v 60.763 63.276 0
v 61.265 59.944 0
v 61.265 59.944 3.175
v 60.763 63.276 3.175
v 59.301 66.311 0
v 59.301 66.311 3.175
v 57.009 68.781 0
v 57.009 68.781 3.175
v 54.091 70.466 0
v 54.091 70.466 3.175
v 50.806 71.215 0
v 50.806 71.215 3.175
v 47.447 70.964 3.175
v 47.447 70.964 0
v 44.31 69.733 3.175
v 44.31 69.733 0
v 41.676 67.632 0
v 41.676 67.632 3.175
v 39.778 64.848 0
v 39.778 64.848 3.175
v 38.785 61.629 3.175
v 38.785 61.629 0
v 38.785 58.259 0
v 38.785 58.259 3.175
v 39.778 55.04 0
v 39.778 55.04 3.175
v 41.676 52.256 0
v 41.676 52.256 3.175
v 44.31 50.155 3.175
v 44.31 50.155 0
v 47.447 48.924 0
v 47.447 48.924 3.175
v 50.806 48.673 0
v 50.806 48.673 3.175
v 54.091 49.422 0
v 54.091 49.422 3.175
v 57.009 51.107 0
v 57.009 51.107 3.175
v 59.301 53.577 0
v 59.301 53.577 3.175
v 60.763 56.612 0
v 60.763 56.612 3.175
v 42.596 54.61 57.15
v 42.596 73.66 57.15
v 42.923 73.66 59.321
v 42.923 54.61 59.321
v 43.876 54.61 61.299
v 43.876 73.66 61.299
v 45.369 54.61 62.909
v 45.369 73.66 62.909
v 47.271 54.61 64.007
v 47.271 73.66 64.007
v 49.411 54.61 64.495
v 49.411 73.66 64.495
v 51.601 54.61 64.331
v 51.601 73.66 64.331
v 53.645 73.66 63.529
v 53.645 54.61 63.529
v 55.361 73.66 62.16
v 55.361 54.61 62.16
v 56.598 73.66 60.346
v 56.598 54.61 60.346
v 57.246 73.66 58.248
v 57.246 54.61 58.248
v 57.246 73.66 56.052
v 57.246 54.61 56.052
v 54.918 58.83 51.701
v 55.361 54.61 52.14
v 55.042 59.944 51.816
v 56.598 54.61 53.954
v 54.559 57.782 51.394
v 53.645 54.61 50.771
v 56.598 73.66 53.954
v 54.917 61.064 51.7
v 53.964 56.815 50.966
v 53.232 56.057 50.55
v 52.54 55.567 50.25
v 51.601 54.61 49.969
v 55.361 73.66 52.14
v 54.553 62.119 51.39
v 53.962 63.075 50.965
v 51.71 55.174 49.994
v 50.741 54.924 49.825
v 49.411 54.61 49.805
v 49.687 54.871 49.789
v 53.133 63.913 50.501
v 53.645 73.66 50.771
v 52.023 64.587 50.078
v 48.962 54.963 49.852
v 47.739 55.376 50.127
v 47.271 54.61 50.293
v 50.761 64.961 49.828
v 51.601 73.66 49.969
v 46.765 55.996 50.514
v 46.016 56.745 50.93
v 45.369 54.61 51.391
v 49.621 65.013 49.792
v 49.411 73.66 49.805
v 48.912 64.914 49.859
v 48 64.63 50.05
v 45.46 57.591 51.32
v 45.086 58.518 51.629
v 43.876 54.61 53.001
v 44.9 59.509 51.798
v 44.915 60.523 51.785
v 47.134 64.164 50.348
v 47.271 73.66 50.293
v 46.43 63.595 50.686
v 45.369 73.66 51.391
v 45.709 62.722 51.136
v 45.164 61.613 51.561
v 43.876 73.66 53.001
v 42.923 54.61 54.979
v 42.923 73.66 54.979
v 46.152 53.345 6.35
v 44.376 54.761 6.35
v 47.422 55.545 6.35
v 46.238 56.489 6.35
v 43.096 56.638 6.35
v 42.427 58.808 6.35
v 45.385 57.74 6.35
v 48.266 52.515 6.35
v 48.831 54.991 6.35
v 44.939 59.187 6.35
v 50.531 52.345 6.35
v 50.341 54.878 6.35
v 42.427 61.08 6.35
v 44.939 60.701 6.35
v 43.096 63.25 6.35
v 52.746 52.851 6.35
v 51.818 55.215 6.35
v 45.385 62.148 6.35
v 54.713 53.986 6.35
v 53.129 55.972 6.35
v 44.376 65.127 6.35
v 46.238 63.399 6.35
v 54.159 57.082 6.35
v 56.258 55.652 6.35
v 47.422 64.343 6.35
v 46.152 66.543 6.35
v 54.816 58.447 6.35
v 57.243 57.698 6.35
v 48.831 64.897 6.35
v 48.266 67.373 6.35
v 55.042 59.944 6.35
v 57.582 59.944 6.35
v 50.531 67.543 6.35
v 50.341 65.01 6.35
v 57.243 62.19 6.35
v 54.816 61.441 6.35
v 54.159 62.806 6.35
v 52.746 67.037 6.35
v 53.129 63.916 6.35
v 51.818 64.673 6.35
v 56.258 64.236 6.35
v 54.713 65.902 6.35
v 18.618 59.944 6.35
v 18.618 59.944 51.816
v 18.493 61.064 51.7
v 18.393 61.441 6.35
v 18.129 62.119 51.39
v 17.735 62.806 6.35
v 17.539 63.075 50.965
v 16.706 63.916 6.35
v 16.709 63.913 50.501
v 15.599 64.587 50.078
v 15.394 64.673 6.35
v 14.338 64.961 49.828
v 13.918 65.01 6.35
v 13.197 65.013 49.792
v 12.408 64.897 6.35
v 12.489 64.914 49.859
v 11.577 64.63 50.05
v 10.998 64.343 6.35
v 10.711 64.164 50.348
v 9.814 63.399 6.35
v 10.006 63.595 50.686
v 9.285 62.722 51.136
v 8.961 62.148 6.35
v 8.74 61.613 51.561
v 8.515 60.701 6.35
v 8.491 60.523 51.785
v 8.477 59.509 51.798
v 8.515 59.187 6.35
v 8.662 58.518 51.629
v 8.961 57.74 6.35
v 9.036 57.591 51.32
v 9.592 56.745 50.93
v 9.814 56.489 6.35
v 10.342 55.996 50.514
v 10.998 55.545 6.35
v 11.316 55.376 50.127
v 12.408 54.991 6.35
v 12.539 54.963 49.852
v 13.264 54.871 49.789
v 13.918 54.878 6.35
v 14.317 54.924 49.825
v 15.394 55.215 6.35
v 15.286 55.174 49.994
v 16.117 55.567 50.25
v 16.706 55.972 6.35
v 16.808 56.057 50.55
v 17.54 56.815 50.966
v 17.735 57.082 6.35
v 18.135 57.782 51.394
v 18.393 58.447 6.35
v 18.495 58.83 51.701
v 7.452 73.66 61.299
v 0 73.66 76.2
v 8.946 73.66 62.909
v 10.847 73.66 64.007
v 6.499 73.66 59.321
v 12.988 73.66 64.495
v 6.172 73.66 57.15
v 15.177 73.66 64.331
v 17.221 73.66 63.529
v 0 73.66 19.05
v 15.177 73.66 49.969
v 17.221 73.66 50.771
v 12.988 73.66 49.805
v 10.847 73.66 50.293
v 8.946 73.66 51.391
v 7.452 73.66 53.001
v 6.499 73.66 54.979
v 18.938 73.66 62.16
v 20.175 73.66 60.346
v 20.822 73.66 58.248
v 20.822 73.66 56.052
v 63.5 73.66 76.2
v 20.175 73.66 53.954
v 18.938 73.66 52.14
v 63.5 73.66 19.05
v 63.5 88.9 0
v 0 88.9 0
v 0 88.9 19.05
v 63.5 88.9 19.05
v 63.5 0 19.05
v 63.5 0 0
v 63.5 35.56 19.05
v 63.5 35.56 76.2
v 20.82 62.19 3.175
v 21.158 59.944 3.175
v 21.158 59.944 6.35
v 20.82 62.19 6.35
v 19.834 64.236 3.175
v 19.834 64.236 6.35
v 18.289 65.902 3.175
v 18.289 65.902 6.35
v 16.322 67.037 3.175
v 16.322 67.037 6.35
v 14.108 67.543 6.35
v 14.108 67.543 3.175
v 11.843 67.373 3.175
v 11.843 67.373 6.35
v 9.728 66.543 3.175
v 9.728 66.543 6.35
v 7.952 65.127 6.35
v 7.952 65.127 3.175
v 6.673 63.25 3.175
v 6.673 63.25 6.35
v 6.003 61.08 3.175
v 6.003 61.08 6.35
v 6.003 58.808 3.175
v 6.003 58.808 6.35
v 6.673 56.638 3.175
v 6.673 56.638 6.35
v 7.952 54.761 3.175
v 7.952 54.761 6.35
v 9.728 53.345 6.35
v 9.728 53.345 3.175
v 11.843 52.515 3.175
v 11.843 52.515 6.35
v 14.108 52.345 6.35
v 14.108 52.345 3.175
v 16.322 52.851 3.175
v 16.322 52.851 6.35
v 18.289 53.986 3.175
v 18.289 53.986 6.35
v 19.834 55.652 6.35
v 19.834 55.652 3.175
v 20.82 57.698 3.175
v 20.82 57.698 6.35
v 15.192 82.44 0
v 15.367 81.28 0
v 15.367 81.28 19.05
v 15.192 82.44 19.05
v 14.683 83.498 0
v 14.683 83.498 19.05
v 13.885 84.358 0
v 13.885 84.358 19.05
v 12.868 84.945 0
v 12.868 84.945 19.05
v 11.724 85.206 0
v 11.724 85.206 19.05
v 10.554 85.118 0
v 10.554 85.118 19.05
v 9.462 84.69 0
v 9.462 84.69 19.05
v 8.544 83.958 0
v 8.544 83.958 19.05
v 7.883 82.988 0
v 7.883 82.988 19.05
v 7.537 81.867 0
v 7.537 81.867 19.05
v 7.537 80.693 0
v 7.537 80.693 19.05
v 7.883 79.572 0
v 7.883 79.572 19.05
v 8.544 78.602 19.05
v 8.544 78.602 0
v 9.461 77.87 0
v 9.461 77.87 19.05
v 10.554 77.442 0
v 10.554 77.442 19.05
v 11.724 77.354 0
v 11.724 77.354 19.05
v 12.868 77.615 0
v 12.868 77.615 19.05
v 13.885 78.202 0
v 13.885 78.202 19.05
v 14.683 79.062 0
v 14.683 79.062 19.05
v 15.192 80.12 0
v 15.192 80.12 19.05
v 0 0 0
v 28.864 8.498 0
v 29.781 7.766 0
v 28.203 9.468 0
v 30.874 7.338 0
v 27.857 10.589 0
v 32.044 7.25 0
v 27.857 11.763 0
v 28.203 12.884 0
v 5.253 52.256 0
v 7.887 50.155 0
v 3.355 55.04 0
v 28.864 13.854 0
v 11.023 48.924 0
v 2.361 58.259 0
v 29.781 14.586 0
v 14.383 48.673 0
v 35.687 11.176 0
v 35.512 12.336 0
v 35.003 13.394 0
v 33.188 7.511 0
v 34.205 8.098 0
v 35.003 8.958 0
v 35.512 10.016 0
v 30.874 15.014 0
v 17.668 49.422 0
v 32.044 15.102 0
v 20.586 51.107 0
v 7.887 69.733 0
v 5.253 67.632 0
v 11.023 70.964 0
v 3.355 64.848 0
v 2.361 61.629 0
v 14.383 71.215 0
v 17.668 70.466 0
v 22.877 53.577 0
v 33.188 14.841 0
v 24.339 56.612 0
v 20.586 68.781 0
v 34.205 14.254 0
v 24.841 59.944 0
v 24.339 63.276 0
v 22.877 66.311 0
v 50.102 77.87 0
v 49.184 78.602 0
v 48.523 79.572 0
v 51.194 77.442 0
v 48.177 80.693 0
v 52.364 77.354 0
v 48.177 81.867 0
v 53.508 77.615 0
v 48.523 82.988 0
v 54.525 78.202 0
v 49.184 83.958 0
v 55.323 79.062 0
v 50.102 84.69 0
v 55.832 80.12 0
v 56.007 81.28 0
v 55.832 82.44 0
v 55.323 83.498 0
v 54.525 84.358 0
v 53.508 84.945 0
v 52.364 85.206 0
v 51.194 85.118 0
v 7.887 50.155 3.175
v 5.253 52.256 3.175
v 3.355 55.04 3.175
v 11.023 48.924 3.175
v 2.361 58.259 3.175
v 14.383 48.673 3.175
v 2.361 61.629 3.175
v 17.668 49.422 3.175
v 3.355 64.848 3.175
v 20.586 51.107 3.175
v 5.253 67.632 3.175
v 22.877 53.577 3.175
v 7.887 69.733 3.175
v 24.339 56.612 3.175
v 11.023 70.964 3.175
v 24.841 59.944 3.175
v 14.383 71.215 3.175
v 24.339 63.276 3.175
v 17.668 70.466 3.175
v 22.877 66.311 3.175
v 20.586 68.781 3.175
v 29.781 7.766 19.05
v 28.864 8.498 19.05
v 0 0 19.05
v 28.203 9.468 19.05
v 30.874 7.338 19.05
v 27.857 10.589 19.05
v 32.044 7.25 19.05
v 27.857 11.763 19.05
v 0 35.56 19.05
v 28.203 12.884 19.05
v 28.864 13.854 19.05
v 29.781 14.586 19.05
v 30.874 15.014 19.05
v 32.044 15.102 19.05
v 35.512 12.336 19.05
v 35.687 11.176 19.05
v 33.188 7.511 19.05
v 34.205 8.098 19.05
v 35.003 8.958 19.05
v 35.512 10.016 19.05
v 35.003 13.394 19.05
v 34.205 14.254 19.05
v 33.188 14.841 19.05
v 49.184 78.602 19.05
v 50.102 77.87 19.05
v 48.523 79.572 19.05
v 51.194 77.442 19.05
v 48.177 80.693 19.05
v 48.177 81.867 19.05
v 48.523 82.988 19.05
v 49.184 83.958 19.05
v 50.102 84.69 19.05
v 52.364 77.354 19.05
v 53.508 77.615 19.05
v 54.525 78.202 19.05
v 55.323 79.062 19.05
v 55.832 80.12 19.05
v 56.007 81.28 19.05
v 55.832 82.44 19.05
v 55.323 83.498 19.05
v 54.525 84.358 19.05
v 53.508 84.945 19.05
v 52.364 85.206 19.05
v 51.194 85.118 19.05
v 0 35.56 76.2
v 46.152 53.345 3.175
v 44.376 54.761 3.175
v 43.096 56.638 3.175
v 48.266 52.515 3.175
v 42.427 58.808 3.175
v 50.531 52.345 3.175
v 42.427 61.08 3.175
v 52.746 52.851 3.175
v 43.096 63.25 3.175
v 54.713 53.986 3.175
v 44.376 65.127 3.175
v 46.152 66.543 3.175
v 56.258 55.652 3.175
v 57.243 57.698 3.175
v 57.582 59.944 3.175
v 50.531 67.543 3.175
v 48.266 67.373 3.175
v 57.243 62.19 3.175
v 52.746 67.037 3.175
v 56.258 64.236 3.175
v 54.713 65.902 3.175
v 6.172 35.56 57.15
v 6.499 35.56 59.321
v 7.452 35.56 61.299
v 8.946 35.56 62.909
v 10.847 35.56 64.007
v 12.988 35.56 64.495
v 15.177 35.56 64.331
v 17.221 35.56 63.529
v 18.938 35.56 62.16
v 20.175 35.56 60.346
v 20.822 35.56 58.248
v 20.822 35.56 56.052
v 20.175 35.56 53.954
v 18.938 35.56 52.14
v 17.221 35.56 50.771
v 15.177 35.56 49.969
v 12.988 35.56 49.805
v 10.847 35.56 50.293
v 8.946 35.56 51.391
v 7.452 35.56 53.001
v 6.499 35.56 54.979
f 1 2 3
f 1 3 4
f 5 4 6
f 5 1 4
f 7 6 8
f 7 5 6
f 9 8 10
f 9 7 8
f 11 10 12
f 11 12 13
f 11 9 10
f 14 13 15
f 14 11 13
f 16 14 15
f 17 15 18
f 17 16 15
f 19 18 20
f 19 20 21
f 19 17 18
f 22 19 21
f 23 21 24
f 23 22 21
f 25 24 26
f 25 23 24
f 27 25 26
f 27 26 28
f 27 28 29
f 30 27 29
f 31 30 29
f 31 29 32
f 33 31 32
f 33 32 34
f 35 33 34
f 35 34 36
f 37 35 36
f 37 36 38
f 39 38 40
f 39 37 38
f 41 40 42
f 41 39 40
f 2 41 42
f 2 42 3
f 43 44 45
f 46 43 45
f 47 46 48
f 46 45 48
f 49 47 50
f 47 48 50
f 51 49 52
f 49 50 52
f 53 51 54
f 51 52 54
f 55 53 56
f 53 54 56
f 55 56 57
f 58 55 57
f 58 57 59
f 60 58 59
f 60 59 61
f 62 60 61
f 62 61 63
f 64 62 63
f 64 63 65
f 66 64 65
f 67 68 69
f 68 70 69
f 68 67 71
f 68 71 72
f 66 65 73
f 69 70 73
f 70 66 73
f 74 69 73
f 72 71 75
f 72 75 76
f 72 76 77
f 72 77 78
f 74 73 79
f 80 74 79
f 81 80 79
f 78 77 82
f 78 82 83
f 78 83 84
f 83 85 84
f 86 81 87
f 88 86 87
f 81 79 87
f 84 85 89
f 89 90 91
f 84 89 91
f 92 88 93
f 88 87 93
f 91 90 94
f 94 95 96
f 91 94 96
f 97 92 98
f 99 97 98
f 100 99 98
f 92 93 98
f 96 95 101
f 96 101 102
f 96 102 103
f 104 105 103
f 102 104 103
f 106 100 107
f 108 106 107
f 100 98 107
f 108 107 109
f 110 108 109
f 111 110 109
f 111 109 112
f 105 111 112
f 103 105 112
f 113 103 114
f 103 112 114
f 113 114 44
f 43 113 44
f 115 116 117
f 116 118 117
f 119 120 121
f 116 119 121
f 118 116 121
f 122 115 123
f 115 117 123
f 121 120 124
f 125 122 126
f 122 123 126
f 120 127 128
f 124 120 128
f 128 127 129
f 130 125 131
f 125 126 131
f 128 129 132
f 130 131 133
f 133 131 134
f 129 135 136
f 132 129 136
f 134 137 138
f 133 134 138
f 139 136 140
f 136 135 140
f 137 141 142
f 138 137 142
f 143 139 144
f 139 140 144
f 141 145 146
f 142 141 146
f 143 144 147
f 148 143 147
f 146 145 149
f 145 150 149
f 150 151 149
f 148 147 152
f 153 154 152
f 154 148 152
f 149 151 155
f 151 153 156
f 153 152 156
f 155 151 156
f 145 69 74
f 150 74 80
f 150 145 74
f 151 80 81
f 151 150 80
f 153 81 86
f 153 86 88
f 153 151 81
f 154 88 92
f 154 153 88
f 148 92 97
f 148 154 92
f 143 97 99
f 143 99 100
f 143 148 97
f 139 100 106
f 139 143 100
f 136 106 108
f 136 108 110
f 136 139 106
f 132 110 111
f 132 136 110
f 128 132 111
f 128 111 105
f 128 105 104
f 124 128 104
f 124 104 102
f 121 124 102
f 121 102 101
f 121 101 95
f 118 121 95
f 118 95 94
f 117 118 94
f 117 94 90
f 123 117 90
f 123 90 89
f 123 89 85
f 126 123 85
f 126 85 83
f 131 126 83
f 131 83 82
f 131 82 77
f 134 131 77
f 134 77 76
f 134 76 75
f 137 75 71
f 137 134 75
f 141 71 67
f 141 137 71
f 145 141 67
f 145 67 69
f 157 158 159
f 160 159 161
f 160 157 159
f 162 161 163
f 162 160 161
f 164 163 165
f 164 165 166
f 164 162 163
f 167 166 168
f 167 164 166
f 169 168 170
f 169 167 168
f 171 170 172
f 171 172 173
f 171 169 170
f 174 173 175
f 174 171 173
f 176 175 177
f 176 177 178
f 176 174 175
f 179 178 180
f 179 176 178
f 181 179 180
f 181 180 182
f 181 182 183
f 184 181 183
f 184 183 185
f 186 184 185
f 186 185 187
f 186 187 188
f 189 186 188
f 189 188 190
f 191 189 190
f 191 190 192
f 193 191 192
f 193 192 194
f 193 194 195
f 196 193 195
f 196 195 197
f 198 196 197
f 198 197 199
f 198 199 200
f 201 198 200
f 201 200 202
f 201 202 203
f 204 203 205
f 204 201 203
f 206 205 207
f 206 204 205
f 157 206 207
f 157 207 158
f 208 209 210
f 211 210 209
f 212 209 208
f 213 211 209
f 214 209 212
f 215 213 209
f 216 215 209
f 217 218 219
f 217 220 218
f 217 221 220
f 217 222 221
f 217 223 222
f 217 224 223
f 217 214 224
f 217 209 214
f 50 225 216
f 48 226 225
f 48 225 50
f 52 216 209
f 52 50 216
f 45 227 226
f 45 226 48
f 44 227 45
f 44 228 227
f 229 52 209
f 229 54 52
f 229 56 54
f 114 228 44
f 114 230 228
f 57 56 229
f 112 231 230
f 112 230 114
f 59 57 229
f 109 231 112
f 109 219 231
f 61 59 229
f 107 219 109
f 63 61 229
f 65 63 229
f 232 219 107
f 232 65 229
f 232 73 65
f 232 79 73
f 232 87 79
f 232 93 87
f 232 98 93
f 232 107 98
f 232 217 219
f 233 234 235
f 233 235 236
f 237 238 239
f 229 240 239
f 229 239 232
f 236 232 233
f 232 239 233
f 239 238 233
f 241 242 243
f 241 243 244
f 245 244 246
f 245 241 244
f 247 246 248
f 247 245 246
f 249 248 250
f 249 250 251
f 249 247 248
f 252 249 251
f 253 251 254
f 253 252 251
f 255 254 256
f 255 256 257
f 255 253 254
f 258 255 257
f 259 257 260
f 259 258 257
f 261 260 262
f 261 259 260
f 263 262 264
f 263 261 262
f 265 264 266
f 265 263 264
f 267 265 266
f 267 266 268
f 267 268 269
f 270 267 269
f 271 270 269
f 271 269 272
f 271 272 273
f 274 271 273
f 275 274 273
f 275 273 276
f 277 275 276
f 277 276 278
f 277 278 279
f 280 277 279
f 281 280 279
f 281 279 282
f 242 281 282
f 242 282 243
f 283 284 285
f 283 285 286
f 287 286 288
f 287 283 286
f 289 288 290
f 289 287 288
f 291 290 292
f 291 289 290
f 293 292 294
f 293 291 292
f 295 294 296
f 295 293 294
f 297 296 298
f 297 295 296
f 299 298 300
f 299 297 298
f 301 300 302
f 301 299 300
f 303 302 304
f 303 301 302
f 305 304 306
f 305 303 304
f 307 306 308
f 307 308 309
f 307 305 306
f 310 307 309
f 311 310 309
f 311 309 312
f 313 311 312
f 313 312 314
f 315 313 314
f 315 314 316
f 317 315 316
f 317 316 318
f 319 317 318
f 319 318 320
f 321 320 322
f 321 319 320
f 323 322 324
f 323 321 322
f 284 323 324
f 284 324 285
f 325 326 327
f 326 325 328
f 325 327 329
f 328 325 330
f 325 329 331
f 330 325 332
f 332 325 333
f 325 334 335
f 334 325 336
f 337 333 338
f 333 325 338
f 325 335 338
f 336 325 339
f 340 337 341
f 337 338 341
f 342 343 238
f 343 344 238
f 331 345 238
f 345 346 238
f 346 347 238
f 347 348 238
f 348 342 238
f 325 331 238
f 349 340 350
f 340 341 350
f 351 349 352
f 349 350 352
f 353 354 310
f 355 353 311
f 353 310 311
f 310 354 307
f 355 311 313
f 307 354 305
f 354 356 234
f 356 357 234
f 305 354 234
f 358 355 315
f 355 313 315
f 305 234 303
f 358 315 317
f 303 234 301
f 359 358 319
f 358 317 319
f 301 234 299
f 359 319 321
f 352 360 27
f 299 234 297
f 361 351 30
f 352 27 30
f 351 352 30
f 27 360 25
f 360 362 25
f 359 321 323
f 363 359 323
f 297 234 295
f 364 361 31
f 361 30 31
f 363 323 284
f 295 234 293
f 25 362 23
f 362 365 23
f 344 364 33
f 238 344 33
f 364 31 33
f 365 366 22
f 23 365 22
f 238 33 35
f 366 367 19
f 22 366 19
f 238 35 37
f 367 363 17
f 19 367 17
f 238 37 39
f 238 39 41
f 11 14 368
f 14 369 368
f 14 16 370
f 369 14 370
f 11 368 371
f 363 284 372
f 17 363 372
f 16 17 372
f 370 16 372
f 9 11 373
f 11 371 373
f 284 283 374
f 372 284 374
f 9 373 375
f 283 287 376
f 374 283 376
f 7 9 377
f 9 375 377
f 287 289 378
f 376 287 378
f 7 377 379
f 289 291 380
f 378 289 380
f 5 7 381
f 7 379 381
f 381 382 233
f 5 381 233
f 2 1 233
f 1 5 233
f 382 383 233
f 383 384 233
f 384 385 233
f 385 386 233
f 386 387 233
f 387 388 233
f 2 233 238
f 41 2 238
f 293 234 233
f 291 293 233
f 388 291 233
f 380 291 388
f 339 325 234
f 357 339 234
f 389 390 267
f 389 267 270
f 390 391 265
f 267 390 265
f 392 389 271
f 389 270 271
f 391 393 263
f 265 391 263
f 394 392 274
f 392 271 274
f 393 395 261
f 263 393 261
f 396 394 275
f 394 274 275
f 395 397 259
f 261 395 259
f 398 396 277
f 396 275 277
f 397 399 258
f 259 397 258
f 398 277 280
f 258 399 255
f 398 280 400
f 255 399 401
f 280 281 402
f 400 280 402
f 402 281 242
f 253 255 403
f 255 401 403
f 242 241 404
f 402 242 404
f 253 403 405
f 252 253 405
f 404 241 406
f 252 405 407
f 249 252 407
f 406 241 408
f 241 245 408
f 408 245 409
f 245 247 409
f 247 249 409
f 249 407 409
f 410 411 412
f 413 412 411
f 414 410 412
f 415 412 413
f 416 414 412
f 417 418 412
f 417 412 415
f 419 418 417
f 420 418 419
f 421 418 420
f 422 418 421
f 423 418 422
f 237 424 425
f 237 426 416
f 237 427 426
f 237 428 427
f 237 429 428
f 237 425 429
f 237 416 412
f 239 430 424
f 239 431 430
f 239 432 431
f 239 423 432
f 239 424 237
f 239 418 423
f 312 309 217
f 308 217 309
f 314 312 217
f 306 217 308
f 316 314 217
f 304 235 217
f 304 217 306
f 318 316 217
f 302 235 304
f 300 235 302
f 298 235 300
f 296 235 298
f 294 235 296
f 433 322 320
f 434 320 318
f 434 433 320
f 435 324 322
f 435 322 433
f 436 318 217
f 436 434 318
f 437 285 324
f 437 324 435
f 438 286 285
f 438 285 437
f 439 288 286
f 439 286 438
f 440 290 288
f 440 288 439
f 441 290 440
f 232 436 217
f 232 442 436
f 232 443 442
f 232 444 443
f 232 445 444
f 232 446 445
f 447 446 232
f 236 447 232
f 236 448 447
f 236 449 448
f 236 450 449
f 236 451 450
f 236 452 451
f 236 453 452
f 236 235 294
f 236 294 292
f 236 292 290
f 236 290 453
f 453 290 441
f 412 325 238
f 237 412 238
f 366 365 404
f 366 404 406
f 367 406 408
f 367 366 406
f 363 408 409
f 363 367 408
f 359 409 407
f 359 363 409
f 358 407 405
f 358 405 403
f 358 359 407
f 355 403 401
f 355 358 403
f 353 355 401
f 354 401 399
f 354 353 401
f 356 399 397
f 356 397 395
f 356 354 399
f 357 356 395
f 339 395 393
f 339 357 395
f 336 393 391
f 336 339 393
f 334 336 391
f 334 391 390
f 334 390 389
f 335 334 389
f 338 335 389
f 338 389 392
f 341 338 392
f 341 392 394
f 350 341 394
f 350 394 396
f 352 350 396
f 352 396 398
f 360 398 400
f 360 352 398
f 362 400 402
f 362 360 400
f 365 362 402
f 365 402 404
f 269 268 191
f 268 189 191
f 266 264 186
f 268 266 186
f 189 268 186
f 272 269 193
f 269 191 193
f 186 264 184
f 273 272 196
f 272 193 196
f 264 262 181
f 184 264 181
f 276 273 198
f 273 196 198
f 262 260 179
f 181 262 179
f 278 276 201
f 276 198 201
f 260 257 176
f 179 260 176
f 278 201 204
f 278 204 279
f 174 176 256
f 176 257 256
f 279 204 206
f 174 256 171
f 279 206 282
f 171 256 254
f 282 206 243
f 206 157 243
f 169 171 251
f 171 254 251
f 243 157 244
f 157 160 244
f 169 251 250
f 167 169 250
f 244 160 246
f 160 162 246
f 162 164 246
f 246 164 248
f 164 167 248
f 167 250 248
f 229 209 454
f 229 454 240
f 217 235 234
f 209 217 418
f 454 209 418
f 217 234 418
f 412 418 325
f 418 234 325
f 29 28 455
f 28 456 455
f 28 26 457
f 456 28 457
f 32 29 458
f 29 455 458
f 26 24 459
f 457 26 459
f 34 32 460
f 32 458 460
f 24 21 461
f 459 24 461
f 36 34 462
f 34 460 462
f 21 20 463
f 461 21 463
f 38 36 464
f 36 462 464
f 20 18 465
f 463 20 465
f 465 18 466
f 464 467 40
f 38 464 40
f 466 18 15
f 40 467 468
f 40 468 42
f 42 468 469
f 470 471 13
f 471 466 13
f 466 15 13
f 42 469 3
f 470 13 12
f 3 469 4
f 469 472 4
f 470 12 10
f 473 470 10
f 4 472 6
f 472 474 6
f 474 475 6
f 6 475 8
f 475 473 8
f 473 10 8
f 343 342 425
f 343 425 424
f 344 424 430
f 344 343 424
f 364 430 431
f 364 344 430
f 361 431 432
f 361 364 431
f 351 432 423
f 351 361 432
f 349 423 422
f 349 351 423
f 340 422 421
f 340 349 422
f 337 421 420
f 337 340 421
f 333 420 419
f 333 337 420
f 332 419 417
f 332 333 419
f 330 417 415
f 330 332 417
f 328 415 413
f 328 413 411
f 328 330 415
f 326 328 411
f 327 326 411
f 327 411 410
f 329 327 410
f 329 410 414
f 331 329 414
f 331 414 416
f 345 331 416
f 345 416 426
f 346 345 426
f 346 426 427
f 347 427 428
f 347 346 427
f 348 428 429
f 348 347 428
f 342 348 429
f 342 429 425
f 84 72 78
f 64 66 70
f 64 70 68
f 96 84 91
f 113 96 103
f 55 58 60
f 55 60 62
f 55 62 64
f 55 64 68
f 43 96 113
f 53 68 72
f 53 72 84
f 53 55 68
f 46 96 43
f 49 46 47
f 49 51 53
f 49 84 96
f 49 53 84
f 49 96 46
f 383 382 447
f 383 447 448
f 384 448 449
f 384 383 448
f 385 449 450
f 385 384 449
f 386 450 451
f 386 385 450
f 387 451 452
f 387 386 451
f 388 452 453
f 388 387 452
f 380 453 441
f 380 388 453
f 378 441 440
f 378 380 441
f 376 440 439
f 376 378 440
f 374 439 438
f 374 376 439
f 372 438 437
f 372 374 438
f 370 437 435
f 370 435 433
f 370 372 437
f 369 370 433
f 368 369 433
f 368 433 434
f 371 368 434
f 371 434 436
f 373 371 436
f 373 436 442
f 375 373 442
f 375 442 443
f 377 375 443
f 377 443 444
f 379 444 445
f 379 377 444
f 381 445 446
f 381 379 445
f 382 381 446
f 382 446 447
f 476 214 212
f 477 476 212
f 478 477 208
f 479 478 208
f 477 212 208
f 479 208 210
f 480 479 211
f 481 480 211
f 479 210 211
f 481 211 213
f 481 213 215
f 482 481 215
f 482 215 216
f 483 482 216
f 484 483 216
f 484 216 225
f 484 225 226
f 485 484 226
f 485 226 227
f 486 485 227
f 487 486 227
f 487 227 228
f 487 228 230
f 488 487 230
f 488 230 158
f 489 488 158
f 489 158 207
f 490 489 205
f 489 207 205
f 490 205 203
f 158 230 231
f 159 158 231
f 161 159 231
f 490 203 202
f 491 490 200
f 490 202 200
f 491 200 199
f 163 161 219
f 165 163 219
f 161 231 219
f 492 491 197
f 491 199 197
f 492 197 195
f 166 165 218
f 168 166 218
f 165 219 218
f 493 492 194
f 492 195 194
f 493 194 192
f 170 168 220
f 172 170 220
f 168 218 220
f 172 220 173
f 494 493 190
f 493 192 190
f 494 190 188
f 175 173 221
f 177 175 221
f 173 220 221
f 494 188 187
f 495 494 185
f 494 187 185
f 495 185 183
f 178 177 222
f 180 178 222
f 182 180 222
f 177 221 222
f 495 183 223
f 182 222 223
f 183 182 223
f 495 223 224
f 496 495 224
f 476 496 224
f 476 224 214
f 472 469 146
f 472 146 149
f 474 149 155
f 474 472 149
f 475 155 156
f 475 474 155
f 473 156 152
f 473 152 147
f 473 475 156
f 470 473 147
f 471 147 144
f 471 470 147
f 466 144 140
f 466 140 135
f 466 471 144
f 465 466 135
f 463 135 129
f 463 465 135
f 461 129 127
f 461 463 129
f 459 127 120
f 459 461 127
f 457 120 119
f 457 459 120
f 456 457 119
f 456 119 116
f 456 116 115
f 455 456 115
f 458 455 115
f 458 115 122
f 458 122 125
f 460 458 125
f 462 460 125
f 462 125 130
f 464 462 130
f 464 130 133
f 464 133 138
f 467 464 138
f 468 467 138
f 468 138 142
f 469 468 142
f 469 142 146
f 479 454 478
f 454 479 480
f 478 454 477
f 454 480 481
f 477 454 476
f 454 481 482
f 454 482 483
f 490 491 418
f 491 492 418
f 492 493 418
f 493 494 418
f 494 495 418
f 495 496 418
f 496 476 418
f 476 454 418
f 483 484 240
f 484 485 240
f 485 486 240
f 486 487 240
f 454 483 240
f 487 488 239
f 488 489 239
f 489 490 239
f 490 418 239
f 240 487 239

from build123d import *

# Parameters (mm, degrees)
F0_W     = 63.5
F0_H     = 35.56
F0_R     = 3.937
F0_R_2   = 11.303
F0_R_3   = 7.62
F0_R_4   = 5.08
F0_H_2   = 15.24
F0_H_3   = 38.1
F1_DEPTH = 19.05
F2_DEPTH = 76.2
F3_DEPTH = 3.175
F4_DEPTH = 6.35
F5_R     = 7.366
F6_DEPTH = 19.05
F7_DEPTH = 50.8
F8_DEPTH = 57.15


with BuildPart() as f1:
    # F0 (on Top) → F1 (new body)
    with BuildSketch(Plane.XY):
        with Locations((31.75, 17.78)):
            Rectangle(F0_W, F0_H)
        with Locations((31.75, 11.176)):
            Circle(F0_R, mode=Mode.SUBTRACT)
        with Locations((49.9618, 59.944)):
            Circle(F0_R_2)
        with Locations((49.9618, 59.944)):
            Circle(F0_R_3, mode=Mode.SUBTRACT)
        with Locations((13.5382, 59.944)):
            Circle(F0_R_2)
        with Locations((13.5382, 59.944)):
            Circle(F0_R_3, mode=Mode.SUBTRACT)
        with Locations((49.9618, 59.944)):
            Circle(F0_R_3)
        with Locations((49.9618, 59.944)):
            Circle(F0_R_4, mode=Mode.SUBTRACT)
        with Locations((13.5382, 59.944)):
            Circle(F0_R_3)
        with Locations((13.5382, 59.944)):
            Circle(F0_R_4, mode=Mode.SUBTRACT)
        with Locations((31.75, 81.28)):
            Rectangle(F0_W, F0_H_2)
        with Locations((11.43, 81.28)):
            Circle(F0_R, mode=Mode.SUBTRACT)
        with Locations((52.07, 81.28)):
            Circle(F0_R, mode=Mode.SUBTRACT)
        with Locations((31.75, 54.61)):
            Rectangle(F0_W, F0_H_3)
        with Locations((13.5382, 59.944)):
            Circle(F0_R_2, mode=Mode.SUBTRACT)
        with Locations((49.9618, 59.944)):
            Circle(F0_R_2, mode=Mode.SUBTRACT)
        with Locations((49.9618, 59.944)):
            Circle(F0_R_4)
        with Locations((13.5382, 59.944)):
            Circle(F0_R_4)
    extrude(amount=F1_DEPTH)

    # F0 (on Top) → F2 (join)
    with BuildSketch(Plane.XY):
        with Locations((31.75, 54.61)):
            Rectangle(F0_W, F0_H_3)
        with Locations((13.5382, 59.944)):
            Circle(F0_R_2, mode=Mode.SUBTRACT)
        with Locations((49.9618, 59.944)):
            Circle(F0_R_2, mode=Mode.SUBTRACT)
        with Locations((13.5382, 59.944)):
            Circle(F0_R_2)
        with Locations((13.5382, 59.944)):
            Circle(F0_R_3, mode=Mode.SUBTRACT)
        with Locations((49.9618, 59.944)):
            Circle(F0_R_2)
        with Locations((49.9618, 59.944)):
            Circle(F0_R_3, mode=Mode.SUBTRACT)
        with Locations((49.9618, 59.944)):
            Circle(F0_R_3)
        with Locations((49.9618, 59.944)):
            Circle(F0_R_4, mode=Mode.SUBTRACT)
        with Locations((13.5382, 59.944)):
            Circle(F0_R_3)
        with Locations((13.5382, 59.944)):
            Circle(F0_R_4, mode=Mode.SUBTRACT)
        with Locations((49.9618, 59.944)):
            Circle(F0_R_4)
        with Locations((13.5382, 59.944)):
            Circle(F0_R_4)
    extrude(amount=F2_DEPTH)

    # F0 (on Top) → F3 (cut)
    with BuildSketch(Plane.XY):
        with Locations((49.9618, 59.944)):
            Circle(F0_R_2)
        with Locations((49.9618, 59.944)):
            Circle(F0_R_3, mode=Mode.SUBTRACT)
        with Locations((13.5382, 59.944)):
            Circle(F0_R_2)
        with Locations((13.5382, 59.944)):
            Circle(F0_R_3, mode=Mode.SUBTRACT)
    extrude(amount=F3_DEPTH, mode=Mode.SUBTRACT)

    # F0 (on Top) → F4 (cut)
    with BuildSketch(Plane.XY):
        with Locations((49.9618, 59.944)):
            Circle(F0_R_3)
        with Locations((49.9618, 59.944)):
            Circle(F0_R_4, mode=Mode.SUBTRACT)
        with Locations((13.5382, 59.944)):
            Circle(F0_R_3)
        with Locations((13.5382, 59.944)):
            Circle(F0_R_4, mode=Mode.SUBTRACT)
    extrude(amount=F4_DEPTH, mode=Mode.SUBTRACT)

    # F5 (on face) → F6 (cut)
    with BuildSketch(Plane(origin=(0, 73.66, 0), x_dir=(-1, 0, 0), z_dir=(0, 1, 0))):
        with Locations((-49.9618, 57.15)):
            Circle(F5_R)
    extrude(amount=-F6_DEPTH, mode=Mode.SUBTRACT)

    # F5 (on face) → F7 (cut)
    with BuildSketch(Plane(origin=(0, 73.66, 0), x_dir=(-1, 0, 0), z_dir=(0, 1, 0))):
        with Locations((-13.5382, 57.15)):
            Circle(F5_R)
    extrude(amount=-F7_DEPTH, mode=Mode.SUBTRACT)

    # F0 (on Top) → F8 (cut)
    with BuildSketch(Plane.XY):
        with Locations((49.9618, 59.944)):
            Circle(F0_R_4)
        with Locations((13.5382, 59.944)):
            Circle(F0_R_4)
    extrude(amount=F8_DEPTH, mode=Mode.SUBTRACT)


solid = f1.part
